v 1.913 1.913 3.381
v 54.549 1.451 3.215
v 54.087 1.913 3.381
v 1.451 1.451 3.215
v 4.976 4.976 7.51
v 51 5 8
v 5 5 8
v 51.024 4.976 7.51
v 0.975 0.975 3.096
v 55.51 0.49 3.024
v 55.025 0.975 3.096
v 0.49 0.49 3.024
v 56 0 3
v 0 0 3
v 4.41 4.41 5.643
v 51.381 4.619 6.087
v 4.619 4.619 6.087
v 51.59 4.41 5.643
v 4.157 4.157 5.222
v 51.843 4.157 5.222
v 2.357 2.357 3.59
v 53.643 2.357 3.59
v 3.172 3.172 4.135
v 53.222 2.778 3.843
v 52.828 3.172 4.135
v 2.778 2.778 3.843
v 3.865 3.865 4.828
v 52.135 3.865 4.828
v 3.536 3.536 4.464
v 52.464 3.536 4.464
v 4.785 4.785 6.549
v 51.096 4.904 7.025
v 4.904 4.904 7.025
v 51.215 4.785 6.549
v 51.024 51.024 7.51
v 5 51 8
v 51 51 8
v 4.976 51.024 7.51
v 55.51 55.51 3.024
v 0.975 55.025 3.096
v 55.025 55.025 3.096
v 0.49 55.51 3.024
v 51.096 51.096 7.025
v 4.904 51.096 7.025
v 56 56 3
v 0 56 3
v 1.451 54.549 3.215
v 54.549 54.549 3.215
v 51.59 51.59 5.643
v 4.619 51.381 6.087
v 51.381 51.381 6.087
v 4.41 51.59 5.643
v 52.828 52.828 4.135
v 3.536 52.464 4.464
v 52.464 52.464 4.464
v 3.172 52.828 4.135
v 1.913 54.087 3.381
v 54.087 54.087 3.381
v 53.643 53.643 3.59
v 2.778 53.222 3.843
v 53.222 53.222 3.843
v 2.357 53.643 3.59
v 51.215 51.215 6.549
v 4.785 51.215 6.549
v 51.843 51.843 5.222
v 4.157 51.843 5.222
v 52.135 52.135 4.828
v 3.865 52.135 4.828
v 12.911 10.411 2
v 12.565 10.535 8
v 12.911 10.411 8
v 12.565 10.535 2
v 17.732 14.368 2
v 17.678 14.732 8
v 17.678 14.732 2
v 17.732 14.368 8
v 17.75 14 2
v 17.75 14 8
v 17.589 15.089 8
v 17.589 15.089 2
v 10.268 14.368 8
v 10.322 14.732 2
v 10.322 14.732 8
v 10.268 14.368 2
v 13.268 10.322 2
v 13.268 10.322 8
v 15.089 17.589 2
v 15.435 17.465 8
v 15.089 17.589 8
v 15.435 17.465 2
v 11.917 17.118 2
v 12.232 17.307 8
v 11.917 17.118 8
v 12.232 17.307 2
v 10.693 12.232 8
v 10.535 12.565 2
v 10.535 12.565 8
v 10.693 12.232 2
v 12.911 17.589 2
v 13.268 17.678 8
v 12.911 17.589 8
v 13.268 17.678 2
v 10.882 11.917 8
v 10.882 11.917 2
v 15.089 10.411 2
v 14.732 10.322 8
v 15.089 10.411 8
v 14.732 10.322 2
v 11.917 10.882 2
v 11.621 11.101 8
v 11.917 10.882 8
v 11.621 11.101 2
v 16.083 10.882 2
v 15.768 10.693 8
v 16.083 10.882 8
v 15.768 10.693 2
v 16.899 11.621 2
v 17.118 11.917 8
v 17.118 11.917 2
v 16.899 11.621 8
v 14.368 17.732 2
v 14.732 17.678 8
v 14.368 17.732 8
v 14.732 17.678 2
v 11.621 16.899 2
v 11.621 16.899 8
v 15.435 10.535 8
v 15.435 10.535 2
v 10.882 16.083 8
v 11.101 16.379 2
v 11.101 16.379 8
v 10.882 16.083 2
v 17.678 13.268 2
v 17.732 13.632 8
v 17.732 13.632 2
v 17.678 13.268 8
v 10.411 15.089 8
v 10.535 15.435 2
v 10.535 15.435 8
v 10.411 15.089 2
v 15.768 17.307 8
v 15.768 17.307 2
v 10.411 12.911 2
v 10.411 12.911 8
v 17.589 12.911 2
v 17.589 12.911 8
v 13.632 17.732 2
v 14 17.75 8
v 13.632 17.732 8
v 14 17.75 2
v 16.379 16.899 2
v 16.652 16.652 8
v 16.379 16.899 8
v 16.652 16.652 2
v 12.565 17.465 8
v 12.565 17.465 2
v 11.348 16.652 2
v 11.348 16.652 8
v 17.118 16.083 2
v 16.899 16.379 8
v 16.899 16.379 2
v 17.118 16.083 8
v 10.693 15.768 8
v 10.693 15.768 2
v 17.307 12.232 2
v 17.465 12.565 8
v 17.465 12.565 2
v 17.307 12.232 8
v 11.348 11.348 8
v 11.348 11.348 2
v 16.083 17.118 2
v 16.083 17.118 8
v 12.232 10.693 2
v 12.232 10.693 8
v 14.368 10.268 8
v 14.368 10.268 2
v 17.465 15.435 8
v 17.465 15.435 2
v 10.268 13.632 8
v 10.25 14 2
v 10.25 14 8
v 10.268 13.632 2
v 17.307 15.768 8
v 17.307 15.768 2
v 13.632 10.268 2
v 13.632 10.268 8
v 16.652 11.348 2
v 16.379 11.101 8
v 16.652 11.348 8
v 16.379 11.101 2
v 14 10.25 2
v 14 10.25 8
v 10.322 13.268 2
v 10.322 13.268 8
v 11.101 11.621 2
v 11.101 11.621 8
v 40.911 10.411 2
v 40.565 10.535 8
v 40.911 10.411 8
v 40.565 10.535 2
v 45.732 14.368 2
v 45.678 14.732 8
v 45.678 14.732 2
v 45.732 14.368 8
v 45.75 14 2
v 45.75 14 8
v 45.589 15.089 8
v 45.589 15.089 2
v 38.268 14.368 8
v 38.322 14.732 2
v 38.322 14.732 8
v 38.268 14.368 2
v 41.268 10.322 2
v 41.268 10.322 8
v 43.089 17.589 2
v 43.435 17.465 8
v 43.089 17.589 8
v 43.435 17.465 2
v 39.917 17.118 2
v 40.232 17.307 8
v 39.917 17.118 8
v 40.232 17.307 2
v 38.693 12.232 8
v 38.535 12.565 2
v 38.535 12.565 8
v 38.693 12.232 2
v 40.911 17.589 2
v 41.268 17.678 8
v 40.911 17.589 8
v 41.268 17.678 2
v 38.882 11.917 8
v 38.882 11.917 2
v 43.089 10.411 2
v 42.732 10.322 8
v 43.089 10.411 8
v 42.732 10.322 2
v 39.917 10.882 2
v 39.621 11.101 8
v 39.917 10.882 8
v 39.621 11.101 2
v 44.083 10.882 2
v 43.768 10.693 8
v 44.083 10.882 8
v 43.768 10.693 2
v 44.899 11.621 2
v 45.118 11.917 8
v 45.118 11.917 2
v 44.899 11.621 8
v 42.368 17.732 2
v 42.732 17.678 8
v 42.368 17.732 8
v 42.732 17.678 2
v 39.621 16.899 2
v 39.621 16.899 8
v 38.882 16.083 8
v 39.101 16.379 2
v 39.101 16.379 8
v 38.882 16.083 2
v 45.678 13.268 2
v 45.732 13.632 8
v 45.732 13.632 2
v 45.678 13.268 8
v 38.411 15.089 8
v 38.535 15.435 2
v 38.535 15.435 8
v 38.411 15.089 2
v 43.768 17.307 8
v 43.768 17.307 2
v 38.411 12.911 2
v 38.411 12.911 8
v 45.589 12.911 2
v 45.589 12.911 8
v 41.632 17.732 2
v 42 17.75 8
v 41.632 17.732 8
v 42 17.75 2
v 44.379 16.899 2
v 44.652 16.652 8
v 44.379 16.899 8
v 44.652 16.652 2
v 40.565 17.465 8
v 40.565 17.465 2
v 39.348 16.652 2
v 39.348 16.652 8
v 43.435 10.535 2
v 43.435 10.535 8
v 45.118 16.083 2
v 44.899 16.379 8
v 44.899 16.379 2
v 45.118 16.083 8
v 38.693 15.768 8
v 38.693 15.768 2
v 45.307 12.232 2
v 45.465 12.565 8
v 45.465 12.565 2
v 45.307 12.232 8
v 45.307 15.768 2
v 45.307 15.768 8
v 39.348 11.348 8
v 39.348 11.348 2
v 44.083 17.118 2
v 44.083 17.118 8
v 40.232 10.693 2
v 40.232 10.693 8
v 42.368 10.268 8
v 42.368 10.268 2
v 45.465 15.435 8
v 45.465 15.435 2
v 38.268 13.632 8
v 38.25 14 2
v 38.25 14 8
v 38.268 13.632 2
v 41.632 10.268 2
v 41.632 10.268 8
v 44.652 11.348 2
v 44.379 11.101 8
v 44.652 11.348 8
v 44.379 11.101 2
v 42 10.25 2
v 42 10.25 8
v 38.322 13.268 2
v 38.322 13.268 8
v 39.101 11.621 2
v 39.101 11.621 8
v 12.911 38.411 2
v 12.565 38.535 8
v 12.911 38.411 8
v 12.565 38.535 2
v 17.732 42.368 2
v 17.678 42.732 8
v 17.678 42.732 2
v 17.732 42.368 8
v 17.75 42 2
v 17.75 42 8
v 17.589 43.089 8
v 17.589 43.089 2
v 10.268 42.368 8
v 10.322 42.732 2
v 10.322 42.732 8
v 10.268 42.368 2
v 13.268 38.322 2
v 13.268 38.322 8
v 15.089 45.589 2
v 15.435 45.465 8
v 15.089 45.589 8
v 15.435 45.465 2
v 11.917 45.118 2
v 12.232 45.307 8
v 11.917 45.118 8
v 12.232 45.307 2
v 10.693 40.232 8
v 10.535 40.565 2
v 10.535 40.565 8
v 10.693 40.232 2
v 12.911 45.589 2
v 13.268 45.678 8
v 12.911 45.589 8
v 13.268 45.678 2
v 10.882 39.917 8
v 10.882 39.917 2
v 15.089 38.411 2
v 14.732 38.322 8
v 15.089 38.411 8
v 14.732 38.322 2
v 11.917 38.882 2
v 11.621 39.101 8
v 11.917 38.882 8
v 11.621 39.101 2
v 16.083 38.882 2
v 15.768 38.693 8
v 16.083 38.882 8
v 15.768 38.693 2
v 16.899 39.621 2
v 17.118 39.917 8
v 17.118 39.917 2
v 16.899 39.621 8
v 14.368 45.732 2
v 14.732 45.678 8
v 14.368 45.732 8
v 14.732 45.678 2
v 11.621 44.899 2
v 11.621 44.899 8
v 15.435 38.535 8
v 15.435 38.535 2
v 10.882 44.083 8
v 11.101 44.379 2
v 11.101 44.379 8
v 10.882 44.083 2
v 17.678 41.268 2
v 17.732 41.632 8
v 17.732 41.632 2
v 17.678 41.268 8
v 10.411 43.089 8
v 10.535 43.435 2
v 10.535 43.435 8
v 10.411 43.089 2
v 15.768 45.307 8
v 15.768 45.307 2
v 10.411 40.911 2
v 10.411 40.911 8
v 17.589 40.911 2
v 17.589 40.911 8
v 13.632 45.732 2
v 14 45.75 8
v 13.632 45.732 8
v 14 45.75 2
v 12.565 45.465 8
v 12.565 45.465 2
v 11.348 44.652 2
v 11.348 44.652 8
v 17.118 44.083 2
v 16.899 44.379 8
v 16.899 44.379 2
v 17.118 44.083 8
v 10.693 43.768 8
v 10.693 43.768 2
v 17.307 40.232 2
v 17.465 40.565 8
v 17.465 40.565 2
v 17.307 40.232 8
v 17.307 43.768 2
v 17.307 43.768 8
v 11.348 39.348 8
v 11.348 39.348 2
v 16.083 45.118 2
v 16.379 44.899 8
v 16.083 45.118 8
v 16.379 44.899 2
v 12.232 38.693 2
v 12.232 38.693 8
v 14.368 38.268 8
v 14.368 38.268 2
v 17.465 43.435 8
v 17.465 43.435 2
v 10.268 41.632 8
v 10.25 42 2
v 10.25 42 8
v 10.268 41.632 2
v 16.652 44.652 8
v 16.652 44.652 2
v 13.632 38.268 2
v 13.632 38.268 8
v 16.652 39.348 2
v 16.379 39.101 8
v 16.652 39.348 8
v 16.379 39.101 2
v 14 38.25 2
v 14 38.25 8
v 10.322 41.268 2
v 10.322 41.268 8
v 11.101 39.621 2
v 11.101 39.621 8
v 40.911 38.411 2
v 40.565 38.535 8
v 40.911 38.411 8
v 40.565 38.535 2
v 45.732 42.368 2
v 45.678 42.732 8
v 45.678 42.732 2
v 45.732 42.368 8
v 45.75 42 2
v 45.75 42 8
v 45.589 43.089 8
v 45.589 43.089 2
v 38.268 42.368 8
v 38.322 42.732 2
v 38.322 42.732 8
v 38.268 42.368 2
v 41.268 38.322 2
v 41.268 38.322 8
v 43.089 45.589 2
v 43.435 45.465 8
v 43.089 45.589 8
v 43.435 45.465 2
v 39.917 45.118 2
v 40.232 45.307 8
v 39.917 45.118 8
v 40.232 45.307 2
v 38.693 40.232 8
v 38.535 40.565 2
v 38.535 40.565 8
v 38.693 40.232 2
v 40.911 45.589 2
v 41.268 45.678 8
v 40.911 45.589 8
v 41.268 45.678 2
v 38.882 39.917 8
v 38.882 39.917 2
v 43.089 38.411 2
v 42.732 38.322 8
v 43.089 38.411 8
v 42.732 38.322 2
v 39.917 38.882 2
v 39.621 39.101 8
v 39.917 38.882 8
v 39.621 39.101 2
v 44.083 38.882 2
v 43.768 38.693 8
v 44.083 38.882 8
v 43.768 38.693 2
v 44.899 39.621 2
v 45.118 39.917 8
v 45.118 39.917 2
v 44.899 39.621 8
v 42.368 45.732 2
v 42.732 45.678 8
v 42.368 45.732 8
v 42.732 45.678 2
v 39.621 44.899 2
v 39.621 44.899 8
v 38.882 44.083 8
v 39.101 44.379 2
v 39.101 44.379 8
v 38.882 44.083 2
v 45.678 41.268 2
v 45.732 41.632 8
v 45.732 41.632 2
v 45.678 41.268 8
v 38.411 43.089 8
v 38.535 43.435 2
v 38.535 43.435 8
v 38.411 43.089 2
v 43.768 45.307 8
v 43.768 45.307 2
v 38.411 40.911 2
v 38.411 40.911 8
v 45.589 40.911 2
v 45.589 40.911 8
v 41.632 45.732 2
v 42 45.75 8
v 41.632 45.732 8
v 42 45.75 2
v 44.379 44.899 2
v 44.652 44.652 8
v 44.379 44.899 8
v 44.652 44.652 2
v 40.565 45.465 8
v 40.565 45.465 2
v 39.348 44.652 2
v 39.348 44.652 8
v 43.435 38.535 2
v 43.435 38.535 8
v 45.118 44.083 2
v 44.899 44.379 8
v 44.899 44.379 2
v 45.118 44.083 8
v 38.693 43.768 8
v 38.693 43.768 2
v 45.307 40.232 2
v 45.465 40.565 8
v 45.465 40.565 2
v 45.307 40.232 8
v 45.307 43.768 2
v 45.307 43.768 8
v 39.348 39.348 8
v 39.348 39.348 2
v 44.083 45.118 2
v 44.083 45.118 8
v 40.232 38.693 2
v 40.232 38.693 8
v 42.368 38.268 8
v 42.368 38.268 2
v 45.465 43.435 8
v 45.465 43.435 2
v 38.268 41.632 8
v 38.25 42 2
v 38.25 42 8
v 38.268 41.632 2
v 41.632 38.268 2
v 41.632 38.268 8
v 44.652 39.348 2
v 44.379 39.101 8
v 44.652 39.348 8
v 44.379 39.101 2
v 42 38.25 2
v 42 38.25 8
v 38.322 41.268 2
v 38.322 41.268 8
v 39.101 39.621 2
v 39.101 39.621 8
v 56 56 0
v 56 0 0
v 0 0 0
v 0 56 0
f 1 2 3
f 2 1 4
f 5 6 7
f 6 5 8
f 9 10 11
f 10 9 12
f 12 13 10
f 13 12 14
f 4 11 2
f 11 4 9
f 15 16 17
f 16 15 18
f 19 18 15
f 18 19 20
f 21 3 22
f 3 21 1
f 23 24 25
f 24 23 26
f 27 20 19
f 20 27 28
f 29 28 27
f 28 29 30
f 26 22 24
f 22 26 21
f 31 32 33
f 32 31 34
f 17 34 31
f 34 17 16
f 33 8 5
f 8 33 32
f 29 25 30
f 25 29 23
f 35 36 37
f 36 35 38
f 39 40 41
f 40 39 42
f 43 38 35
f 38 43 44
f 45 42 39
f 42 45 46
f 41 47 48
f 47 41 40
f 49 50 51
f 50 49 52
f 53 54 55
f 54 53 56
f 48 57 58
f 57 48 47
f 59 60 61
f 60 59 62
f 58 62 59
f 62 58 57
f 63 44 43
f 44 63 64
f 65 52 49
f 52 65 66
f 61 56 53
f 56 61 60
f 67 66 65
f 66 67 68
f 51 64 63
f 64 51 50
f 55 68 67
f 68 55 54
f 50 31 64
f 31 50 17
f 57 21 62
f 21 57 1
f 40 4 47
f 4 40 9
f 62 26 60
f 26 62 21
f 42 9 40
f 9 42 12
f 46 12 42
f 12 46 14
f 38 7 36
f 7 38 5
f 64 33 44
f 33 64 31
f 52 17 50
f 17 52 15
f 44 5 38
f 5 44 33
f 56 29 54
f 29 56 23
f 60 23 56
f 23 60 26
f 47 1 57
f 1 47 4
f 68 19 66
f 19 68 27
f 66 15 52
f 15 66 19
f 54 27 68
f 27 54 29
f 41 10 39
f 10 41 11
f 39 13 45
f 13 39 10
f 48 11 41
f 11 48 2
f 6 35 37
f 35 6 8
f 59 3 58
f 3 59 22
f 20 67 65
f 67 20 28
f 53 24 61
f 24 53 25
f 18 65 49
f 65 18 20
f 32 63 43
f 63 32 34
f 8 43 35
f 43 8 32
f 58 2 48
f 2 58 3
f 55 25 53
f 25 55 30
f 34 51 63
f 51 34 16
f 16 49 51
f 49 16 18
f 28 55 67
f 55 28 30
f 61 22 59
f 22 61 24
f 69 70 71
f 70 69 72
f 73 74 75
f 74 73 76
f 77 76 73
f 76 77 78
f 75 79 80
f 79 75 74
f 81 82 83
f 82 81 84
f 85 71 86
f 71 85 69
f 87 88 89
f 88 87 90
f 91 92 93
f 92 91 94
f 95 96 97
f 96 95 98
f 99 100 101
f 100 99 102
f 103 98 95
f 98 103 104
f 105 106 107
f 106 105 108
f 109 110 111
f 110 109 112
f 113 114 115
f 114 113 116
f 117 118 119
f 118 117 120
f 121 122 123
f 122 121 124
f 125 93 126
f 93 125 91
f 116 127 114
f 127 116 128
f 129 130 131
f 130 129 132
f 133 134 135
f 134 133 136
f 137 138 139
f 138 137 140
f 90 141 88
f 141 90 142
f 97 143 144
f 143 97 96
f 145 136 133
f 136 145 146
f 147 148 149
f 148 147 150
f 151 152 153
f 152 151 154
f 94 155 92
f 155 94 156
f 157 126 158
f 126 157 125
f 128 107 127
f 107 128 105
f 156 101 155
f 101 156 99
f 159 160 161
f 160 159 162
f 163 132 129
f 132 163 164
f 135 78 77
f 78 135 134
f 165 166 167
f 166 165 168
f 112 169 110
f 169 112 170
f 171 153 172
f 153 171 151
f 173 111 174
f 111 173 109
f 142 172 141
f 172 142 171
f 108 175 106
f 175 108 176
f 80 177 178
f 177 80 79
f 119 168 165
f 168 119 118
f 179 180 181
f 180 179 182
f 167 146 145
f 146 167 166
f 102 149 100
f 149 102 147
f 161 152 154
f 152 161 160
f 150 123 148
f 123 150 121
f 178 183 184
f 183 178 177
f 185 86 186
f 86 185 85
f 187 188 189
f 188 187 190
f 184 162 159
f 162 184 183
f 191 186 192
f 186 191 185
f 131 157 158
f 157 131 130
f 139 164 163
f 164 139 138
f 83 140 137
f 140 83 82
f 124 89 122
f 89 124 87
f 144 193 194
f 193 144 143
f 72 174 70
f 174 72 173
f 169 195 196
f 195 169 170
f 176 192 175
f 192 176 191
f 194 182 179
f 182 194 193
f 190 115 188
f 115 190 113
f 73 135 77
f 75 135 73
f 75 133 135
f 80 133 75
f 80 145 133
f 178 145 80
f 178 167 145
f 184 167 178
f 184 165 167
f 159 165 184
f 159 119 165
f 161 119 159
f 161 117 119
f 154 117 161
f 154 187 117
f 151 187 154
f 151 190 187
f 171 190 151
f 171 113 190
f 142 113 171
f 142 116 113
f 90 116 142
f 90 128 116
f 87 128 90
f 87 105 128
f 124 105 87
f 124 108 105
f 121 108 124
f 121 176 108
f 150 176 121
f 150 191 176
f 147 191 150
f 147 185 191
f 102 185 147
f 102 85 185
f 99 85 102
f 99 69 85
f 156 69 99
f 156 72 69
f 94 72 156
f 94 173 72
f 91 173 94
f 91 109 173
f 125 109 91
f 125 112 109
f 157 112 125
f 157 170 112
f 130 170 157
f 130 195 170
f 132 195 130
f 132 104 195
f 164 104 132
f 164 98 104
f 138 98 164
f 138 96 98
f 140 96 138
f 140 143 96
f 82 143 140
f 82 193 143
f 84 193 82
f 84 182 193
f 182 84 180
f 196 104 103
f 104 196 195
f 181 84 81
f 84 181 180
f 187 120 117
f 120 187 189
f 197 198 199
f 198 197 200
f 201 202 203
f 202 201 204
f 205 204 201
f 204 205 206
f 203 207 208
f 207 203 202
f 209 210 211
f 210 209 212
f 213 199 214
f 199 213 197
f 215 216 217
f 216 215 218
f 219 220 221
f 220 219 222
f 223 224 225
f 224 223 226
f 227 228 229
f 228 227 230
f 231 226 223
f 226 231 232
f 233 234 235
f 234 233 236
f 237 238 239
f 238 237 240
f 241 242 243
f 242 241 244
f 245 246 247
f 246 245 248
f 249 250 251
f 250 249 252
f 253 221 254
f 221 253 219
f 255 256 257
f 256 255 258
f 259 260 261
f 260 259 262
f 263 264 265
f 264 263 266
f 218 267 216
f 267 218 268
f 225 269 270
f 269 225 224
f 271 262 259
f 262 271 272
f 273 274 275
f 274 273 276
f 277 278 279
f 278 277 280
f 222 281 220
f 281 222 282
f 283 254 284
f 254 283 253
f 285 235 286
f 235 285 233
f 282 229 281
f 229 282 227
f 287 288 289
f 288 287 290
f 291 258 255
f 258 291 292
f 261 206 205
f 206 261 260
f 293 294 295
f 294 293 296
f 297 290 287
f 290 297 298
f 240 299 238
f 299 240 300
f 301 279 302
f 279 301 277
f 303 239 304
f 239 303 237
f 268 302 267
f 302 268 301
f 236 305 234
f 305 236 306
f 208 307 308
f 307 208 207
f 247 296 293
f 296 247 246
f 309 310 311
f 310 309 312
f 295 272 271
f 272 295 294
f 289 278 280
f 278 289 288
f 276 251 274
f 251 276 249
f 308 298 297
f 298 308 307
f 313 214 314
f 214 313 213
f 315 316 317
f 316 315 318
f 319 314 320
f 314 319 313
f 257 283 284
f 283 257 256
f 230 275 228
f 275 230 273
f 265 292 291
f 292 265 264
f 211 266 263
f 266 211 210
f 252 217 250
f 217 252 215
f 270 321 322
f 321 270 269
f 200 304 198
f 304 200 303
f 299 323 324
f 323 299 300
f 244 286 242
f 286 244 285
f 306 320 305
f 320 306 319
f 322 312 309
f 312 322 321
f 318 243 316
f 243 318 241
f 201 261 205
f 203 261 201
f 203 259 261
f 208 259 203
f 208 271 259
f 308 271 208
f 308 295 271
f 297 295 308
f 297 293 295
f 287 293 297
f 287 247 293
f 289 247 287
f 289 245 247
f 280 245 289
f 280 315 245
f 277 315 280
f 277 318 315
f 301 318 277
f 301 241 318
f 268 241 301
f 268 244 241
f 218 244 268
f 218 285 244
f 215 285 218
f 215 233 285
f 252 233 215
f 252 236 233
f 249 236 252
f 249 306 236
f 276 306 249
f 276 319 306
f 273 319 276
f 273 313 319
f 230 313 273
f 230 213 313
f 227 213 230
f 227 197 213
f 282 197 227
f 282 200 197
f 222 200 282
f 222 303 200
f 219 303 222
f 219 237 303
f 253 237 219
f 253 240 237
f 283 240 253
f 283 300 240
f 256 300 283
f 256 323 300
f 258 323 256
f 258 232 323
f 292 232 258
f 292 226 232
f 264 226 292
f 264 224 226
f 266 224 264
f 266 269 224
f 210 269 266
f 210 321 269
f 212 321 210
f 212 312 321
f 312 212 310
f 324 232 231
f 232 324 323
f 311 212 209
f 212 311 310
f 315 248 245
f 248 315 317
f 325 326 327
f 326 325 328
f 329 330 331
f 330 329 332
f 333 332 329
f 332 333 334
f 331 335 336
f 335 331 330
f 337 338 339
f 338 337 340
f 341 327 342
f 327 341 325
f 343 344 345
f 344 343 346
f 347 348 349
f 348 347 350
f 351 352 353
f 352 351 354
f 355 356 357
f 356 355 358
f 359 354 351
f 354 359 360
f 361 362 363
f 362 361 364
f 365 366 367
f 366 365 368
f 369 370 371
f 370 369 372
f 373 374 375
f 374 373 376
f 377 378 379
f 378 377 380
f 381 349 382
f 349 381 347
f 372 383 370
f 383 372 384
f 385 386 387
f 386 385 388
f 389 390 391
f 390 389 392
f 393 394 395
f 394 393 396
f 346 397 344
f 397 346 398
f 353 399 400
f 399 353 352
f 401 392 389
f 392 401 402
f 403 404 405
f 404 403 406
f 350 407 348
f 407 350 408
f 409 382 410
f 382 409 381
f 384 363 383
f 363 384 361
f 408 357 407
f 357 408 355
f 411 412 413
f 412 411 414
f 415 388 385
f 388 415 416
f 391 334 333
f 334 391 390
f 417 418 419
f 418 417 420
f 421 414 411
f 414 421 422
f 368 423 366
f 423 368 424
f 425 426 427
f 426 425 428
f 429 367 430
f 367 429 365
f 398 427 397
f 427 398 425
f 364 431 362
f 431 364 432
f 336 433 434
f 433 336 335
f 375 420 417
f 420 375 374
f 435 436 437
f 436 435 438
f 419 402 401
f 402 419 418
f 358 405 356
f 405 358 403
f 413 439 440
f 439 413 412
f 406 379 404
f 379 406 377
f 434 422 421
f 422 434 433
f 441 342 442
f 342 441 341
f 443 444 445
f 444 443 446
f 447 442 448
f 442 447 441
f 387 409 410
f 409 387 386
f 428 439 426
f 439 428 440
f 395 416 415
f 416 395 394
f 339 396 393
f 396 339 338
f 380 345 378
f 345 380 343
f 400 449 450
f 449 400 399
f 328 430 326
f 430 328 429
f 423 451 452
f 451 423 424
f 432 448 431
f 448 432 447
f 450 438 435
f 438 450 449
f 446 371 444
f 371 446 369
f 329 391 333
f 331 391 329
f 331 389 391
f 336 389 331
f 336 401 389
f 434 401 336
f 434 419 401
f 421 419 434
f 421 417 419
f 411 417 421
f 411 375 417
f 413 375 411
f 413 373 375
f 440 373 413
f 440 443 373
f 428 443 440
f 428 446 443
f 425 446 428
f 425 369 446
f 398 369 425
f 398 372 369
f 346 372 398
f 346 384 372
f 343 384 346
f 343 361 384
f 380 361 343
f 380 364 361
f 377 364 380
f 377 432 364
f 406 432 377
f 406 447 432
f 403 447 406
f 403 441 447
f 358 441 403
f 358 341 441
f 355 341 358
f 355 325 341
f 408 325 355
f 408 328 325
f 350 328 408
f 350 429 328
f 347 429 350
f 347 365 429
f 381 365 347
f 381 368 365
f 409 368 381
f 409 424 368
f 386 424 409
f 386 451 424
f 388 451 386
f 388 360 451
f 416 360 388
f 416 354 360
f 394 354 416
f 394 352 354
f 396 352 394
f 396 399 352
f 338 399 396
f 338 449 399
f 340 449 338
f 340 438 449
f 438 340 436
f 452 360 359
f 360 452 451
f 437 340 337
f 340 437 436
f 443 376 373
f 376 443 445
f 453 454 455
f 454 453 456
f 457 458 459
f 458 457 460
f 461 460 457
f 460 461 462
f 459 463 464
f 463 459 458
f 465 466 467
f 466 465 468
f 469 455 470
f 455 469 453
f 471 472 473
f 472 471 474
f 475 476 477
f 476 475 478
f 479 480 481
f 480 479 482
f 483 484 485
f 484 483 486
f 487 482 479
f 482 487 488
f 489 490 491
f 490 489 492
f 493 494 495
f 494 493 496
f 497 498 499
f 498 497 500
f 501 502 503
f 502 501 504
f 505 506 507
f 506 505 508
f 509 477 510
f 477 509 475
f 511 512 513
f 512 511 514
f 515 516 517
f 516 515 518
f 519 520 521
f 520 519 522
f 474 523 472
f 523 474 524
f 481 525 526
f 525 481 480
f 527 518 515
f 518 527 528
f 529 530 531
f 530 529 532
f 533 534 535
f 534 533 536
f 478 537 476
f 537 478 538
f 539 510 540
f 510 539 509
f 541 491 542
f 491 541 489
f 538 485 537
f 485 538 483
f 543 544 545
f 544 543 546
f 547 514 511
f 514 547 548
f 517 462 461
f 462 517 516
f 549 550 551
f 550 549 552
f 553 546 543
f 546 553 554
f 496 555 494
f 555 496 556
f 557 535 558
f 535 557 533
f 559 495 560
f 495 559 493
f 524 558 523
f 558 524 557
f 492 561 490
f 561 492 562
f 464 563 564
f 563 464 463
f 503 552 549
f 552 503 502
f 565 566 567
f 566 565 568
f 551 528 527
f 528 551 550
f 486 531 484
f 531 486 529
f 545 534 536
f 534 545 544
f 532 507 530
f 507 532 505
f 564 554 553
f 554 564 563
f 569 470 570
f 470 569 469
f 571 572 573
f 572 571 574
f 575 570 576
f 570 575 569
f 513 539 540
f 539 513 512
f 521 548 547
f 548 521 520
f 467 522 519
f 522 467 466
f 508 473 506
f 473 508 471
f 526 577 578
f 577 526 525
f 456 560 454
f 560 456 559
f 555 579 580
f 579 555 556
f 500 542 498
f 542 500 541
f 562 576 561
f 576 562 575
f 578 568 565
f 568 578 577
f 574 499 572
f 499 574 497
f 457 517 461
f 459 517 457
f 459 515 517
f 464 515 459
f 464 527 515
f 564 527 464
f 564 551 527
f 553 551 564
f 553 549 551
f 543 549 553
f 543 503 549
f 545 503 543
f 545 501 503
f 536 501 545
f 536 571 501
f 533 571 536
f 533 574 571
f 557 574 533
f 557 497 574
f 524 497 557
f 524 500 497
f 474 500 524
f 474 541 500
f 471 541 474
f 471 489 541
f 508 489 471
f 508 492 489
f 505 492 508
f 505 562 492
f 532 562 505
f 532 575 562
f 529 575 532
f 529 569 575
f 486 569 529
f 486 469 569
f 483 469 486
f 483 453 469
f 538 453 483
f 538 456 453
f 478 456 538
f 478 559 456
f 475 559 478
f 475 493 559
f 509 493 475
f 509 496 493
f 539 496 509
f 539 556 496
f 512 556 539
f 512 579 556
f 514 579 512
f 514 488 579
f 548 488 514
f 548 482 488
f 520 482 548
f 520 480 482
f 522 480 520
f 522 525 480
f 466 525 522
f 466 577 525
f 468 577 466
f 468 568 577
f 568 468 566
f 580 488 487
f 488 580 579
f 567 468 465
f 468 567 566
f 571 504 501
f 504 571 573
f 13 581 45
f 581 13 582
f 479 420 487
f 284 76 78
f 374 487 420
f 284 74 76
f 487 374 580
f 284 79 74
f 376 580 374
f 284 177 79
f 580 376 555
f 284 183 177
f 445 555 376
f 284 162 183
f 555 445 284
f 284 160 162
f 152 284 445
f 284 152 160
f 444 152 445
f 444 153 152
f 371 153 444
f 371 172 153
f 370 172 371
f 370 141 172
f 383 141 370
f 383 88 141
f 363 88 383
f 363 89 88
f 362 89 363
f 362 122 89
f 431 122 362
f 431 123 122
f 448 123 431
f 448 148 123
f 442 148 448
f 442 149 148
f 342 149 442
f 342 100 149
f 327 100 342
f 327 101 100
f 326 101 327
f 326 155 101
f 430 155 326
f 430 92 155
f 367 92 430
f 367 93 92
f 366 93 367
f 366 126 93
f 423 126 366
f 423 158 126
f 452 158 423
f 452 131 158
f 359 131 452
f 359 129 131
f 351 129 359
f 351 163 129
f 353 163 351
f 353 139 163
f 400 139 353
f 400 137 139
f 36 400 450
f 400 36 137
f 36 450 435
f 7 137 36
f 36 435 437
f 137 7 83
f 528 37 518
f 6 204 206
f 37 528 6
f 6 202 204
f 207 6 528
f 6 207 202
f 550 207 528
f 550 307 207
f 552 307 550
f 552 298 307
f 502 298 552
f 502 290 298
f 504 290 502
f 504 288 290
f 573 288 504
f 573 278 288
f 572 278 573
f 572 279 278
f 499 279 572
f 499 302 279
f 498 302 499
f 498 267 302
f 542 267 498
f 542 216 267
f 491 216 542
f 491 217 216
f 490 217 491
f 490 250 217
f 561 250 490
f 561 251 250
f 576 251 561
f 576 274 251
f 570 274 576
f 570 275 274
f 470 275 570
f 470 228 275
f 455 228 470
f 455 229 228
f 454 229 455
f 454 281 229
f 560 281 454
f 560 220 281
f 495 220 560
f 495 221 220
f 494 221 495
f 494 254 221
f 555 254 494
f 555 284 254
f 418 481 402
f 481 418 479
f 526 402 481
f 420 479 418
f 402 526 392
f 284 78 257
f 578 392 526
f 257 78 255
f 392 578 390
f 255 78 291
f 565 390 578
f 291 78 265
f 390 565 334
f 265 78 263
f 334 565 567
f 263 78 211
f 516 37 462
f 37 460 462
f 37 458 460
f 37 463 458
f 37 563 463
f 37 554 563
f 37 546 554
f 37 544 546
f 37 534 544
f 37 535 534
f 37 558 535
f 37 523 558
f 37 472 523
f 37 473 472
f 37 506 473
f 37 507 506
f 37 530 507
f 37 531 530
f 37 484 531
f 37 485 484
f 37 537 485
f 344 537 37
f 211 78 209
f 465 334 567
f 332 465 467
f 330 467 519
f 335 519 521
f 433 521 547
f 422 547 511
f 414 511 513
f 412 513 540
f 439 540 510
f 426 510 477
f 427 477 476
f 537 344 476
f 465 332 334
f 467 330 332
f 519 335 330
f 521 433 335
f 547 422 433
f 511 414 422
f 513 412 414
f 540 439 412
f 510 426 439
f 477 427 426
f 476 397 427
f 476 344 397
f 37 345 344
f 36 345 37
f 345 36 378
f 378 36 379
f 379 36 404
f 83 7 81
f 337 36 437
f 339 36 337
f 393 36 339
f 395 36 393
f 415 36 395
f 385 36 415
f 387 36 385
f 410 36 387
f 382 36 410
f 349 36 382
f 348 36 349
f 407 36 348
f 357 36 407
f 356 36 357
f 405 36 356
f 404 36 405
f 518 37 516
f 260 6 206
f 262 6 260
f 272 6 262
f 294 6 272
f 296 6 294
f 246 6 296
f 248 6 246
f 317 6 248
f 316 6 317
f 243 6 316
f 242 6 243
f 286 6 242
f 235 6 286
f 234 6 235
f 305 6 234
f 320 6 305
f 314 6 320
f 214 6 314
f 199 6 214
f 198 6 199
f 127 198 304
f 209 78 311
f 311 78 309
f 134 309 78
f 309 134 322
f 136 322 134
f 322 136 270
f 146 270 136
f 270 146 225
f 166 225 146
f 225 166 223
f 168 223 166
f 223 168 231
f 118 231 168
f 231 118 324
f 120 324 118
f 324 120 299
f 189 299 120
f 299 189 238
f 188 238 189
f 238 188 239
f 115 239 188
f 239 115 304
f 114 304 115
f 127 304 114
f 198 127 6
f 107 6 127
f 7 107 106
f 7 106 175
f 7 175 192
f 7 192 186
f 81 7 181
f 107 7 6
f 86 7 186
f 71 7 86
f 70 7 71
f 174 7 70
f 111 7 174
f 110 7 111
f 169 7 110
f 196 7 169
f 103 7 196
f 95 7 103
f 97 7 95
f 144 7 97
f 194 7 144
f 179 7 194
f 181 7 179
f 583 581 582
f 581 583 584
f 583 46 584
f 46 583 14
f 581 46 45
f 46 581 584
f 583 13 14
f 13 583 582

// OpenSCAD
// preview[view:south west, tilt:top diagonal]

/* [Base] */
// Diameter of the 510 pin
pinDiameter = 7.5;
// Depth for the 510 hole
pinDepth = 6;
// Diameter of the Atomizer
outerDiameter = 25;
// Spacing between Atomizers
spacing = 3;
// Rows
rows = 2;
// Columns
columns = 2;

/* [Hidden] */
$fn = 64;
bottomHeight = 2;

/* Calculated */
height = pinDepth + bottomHeight;
length = columns * (outerDiameter + spacing);
width = rows * (outerDiameter + spacing);

difference() {
    cube([length, width, height]);
    
    rotate([0, 90, 0]) {
        translate([-height, 0, -1])
            cylinder(r=5, h = length + 2);
        translate([-height, width, -1])
            cylinder(r=5, h = length + 2);
    }
    
    rotate([-90, 90, 0]) {
        translate([-height, 0, -1])
            cylinder(r=5, h = width + 2);
        translate([-height, -length, -1])
            cylinder(r=5, h = width + 2);
    }
    
    xOffset = ((spacing + outerDiameter) / 2);
    yOffset = ((spacing + outerDiameter) / 2);
    zOffset = height - pinDepth;
    
    for(n =[0:rows - 1]) {
        for(k =[0:columns - 1]) {
            translate([xOffset + (spacing + outerDiameter) * k, yOffset + (spacing + outerDiameter) * n, zOffset])
                cylinder(r  = pinDiameter / 2, h = pinDepth +1);
        }
    }
}
